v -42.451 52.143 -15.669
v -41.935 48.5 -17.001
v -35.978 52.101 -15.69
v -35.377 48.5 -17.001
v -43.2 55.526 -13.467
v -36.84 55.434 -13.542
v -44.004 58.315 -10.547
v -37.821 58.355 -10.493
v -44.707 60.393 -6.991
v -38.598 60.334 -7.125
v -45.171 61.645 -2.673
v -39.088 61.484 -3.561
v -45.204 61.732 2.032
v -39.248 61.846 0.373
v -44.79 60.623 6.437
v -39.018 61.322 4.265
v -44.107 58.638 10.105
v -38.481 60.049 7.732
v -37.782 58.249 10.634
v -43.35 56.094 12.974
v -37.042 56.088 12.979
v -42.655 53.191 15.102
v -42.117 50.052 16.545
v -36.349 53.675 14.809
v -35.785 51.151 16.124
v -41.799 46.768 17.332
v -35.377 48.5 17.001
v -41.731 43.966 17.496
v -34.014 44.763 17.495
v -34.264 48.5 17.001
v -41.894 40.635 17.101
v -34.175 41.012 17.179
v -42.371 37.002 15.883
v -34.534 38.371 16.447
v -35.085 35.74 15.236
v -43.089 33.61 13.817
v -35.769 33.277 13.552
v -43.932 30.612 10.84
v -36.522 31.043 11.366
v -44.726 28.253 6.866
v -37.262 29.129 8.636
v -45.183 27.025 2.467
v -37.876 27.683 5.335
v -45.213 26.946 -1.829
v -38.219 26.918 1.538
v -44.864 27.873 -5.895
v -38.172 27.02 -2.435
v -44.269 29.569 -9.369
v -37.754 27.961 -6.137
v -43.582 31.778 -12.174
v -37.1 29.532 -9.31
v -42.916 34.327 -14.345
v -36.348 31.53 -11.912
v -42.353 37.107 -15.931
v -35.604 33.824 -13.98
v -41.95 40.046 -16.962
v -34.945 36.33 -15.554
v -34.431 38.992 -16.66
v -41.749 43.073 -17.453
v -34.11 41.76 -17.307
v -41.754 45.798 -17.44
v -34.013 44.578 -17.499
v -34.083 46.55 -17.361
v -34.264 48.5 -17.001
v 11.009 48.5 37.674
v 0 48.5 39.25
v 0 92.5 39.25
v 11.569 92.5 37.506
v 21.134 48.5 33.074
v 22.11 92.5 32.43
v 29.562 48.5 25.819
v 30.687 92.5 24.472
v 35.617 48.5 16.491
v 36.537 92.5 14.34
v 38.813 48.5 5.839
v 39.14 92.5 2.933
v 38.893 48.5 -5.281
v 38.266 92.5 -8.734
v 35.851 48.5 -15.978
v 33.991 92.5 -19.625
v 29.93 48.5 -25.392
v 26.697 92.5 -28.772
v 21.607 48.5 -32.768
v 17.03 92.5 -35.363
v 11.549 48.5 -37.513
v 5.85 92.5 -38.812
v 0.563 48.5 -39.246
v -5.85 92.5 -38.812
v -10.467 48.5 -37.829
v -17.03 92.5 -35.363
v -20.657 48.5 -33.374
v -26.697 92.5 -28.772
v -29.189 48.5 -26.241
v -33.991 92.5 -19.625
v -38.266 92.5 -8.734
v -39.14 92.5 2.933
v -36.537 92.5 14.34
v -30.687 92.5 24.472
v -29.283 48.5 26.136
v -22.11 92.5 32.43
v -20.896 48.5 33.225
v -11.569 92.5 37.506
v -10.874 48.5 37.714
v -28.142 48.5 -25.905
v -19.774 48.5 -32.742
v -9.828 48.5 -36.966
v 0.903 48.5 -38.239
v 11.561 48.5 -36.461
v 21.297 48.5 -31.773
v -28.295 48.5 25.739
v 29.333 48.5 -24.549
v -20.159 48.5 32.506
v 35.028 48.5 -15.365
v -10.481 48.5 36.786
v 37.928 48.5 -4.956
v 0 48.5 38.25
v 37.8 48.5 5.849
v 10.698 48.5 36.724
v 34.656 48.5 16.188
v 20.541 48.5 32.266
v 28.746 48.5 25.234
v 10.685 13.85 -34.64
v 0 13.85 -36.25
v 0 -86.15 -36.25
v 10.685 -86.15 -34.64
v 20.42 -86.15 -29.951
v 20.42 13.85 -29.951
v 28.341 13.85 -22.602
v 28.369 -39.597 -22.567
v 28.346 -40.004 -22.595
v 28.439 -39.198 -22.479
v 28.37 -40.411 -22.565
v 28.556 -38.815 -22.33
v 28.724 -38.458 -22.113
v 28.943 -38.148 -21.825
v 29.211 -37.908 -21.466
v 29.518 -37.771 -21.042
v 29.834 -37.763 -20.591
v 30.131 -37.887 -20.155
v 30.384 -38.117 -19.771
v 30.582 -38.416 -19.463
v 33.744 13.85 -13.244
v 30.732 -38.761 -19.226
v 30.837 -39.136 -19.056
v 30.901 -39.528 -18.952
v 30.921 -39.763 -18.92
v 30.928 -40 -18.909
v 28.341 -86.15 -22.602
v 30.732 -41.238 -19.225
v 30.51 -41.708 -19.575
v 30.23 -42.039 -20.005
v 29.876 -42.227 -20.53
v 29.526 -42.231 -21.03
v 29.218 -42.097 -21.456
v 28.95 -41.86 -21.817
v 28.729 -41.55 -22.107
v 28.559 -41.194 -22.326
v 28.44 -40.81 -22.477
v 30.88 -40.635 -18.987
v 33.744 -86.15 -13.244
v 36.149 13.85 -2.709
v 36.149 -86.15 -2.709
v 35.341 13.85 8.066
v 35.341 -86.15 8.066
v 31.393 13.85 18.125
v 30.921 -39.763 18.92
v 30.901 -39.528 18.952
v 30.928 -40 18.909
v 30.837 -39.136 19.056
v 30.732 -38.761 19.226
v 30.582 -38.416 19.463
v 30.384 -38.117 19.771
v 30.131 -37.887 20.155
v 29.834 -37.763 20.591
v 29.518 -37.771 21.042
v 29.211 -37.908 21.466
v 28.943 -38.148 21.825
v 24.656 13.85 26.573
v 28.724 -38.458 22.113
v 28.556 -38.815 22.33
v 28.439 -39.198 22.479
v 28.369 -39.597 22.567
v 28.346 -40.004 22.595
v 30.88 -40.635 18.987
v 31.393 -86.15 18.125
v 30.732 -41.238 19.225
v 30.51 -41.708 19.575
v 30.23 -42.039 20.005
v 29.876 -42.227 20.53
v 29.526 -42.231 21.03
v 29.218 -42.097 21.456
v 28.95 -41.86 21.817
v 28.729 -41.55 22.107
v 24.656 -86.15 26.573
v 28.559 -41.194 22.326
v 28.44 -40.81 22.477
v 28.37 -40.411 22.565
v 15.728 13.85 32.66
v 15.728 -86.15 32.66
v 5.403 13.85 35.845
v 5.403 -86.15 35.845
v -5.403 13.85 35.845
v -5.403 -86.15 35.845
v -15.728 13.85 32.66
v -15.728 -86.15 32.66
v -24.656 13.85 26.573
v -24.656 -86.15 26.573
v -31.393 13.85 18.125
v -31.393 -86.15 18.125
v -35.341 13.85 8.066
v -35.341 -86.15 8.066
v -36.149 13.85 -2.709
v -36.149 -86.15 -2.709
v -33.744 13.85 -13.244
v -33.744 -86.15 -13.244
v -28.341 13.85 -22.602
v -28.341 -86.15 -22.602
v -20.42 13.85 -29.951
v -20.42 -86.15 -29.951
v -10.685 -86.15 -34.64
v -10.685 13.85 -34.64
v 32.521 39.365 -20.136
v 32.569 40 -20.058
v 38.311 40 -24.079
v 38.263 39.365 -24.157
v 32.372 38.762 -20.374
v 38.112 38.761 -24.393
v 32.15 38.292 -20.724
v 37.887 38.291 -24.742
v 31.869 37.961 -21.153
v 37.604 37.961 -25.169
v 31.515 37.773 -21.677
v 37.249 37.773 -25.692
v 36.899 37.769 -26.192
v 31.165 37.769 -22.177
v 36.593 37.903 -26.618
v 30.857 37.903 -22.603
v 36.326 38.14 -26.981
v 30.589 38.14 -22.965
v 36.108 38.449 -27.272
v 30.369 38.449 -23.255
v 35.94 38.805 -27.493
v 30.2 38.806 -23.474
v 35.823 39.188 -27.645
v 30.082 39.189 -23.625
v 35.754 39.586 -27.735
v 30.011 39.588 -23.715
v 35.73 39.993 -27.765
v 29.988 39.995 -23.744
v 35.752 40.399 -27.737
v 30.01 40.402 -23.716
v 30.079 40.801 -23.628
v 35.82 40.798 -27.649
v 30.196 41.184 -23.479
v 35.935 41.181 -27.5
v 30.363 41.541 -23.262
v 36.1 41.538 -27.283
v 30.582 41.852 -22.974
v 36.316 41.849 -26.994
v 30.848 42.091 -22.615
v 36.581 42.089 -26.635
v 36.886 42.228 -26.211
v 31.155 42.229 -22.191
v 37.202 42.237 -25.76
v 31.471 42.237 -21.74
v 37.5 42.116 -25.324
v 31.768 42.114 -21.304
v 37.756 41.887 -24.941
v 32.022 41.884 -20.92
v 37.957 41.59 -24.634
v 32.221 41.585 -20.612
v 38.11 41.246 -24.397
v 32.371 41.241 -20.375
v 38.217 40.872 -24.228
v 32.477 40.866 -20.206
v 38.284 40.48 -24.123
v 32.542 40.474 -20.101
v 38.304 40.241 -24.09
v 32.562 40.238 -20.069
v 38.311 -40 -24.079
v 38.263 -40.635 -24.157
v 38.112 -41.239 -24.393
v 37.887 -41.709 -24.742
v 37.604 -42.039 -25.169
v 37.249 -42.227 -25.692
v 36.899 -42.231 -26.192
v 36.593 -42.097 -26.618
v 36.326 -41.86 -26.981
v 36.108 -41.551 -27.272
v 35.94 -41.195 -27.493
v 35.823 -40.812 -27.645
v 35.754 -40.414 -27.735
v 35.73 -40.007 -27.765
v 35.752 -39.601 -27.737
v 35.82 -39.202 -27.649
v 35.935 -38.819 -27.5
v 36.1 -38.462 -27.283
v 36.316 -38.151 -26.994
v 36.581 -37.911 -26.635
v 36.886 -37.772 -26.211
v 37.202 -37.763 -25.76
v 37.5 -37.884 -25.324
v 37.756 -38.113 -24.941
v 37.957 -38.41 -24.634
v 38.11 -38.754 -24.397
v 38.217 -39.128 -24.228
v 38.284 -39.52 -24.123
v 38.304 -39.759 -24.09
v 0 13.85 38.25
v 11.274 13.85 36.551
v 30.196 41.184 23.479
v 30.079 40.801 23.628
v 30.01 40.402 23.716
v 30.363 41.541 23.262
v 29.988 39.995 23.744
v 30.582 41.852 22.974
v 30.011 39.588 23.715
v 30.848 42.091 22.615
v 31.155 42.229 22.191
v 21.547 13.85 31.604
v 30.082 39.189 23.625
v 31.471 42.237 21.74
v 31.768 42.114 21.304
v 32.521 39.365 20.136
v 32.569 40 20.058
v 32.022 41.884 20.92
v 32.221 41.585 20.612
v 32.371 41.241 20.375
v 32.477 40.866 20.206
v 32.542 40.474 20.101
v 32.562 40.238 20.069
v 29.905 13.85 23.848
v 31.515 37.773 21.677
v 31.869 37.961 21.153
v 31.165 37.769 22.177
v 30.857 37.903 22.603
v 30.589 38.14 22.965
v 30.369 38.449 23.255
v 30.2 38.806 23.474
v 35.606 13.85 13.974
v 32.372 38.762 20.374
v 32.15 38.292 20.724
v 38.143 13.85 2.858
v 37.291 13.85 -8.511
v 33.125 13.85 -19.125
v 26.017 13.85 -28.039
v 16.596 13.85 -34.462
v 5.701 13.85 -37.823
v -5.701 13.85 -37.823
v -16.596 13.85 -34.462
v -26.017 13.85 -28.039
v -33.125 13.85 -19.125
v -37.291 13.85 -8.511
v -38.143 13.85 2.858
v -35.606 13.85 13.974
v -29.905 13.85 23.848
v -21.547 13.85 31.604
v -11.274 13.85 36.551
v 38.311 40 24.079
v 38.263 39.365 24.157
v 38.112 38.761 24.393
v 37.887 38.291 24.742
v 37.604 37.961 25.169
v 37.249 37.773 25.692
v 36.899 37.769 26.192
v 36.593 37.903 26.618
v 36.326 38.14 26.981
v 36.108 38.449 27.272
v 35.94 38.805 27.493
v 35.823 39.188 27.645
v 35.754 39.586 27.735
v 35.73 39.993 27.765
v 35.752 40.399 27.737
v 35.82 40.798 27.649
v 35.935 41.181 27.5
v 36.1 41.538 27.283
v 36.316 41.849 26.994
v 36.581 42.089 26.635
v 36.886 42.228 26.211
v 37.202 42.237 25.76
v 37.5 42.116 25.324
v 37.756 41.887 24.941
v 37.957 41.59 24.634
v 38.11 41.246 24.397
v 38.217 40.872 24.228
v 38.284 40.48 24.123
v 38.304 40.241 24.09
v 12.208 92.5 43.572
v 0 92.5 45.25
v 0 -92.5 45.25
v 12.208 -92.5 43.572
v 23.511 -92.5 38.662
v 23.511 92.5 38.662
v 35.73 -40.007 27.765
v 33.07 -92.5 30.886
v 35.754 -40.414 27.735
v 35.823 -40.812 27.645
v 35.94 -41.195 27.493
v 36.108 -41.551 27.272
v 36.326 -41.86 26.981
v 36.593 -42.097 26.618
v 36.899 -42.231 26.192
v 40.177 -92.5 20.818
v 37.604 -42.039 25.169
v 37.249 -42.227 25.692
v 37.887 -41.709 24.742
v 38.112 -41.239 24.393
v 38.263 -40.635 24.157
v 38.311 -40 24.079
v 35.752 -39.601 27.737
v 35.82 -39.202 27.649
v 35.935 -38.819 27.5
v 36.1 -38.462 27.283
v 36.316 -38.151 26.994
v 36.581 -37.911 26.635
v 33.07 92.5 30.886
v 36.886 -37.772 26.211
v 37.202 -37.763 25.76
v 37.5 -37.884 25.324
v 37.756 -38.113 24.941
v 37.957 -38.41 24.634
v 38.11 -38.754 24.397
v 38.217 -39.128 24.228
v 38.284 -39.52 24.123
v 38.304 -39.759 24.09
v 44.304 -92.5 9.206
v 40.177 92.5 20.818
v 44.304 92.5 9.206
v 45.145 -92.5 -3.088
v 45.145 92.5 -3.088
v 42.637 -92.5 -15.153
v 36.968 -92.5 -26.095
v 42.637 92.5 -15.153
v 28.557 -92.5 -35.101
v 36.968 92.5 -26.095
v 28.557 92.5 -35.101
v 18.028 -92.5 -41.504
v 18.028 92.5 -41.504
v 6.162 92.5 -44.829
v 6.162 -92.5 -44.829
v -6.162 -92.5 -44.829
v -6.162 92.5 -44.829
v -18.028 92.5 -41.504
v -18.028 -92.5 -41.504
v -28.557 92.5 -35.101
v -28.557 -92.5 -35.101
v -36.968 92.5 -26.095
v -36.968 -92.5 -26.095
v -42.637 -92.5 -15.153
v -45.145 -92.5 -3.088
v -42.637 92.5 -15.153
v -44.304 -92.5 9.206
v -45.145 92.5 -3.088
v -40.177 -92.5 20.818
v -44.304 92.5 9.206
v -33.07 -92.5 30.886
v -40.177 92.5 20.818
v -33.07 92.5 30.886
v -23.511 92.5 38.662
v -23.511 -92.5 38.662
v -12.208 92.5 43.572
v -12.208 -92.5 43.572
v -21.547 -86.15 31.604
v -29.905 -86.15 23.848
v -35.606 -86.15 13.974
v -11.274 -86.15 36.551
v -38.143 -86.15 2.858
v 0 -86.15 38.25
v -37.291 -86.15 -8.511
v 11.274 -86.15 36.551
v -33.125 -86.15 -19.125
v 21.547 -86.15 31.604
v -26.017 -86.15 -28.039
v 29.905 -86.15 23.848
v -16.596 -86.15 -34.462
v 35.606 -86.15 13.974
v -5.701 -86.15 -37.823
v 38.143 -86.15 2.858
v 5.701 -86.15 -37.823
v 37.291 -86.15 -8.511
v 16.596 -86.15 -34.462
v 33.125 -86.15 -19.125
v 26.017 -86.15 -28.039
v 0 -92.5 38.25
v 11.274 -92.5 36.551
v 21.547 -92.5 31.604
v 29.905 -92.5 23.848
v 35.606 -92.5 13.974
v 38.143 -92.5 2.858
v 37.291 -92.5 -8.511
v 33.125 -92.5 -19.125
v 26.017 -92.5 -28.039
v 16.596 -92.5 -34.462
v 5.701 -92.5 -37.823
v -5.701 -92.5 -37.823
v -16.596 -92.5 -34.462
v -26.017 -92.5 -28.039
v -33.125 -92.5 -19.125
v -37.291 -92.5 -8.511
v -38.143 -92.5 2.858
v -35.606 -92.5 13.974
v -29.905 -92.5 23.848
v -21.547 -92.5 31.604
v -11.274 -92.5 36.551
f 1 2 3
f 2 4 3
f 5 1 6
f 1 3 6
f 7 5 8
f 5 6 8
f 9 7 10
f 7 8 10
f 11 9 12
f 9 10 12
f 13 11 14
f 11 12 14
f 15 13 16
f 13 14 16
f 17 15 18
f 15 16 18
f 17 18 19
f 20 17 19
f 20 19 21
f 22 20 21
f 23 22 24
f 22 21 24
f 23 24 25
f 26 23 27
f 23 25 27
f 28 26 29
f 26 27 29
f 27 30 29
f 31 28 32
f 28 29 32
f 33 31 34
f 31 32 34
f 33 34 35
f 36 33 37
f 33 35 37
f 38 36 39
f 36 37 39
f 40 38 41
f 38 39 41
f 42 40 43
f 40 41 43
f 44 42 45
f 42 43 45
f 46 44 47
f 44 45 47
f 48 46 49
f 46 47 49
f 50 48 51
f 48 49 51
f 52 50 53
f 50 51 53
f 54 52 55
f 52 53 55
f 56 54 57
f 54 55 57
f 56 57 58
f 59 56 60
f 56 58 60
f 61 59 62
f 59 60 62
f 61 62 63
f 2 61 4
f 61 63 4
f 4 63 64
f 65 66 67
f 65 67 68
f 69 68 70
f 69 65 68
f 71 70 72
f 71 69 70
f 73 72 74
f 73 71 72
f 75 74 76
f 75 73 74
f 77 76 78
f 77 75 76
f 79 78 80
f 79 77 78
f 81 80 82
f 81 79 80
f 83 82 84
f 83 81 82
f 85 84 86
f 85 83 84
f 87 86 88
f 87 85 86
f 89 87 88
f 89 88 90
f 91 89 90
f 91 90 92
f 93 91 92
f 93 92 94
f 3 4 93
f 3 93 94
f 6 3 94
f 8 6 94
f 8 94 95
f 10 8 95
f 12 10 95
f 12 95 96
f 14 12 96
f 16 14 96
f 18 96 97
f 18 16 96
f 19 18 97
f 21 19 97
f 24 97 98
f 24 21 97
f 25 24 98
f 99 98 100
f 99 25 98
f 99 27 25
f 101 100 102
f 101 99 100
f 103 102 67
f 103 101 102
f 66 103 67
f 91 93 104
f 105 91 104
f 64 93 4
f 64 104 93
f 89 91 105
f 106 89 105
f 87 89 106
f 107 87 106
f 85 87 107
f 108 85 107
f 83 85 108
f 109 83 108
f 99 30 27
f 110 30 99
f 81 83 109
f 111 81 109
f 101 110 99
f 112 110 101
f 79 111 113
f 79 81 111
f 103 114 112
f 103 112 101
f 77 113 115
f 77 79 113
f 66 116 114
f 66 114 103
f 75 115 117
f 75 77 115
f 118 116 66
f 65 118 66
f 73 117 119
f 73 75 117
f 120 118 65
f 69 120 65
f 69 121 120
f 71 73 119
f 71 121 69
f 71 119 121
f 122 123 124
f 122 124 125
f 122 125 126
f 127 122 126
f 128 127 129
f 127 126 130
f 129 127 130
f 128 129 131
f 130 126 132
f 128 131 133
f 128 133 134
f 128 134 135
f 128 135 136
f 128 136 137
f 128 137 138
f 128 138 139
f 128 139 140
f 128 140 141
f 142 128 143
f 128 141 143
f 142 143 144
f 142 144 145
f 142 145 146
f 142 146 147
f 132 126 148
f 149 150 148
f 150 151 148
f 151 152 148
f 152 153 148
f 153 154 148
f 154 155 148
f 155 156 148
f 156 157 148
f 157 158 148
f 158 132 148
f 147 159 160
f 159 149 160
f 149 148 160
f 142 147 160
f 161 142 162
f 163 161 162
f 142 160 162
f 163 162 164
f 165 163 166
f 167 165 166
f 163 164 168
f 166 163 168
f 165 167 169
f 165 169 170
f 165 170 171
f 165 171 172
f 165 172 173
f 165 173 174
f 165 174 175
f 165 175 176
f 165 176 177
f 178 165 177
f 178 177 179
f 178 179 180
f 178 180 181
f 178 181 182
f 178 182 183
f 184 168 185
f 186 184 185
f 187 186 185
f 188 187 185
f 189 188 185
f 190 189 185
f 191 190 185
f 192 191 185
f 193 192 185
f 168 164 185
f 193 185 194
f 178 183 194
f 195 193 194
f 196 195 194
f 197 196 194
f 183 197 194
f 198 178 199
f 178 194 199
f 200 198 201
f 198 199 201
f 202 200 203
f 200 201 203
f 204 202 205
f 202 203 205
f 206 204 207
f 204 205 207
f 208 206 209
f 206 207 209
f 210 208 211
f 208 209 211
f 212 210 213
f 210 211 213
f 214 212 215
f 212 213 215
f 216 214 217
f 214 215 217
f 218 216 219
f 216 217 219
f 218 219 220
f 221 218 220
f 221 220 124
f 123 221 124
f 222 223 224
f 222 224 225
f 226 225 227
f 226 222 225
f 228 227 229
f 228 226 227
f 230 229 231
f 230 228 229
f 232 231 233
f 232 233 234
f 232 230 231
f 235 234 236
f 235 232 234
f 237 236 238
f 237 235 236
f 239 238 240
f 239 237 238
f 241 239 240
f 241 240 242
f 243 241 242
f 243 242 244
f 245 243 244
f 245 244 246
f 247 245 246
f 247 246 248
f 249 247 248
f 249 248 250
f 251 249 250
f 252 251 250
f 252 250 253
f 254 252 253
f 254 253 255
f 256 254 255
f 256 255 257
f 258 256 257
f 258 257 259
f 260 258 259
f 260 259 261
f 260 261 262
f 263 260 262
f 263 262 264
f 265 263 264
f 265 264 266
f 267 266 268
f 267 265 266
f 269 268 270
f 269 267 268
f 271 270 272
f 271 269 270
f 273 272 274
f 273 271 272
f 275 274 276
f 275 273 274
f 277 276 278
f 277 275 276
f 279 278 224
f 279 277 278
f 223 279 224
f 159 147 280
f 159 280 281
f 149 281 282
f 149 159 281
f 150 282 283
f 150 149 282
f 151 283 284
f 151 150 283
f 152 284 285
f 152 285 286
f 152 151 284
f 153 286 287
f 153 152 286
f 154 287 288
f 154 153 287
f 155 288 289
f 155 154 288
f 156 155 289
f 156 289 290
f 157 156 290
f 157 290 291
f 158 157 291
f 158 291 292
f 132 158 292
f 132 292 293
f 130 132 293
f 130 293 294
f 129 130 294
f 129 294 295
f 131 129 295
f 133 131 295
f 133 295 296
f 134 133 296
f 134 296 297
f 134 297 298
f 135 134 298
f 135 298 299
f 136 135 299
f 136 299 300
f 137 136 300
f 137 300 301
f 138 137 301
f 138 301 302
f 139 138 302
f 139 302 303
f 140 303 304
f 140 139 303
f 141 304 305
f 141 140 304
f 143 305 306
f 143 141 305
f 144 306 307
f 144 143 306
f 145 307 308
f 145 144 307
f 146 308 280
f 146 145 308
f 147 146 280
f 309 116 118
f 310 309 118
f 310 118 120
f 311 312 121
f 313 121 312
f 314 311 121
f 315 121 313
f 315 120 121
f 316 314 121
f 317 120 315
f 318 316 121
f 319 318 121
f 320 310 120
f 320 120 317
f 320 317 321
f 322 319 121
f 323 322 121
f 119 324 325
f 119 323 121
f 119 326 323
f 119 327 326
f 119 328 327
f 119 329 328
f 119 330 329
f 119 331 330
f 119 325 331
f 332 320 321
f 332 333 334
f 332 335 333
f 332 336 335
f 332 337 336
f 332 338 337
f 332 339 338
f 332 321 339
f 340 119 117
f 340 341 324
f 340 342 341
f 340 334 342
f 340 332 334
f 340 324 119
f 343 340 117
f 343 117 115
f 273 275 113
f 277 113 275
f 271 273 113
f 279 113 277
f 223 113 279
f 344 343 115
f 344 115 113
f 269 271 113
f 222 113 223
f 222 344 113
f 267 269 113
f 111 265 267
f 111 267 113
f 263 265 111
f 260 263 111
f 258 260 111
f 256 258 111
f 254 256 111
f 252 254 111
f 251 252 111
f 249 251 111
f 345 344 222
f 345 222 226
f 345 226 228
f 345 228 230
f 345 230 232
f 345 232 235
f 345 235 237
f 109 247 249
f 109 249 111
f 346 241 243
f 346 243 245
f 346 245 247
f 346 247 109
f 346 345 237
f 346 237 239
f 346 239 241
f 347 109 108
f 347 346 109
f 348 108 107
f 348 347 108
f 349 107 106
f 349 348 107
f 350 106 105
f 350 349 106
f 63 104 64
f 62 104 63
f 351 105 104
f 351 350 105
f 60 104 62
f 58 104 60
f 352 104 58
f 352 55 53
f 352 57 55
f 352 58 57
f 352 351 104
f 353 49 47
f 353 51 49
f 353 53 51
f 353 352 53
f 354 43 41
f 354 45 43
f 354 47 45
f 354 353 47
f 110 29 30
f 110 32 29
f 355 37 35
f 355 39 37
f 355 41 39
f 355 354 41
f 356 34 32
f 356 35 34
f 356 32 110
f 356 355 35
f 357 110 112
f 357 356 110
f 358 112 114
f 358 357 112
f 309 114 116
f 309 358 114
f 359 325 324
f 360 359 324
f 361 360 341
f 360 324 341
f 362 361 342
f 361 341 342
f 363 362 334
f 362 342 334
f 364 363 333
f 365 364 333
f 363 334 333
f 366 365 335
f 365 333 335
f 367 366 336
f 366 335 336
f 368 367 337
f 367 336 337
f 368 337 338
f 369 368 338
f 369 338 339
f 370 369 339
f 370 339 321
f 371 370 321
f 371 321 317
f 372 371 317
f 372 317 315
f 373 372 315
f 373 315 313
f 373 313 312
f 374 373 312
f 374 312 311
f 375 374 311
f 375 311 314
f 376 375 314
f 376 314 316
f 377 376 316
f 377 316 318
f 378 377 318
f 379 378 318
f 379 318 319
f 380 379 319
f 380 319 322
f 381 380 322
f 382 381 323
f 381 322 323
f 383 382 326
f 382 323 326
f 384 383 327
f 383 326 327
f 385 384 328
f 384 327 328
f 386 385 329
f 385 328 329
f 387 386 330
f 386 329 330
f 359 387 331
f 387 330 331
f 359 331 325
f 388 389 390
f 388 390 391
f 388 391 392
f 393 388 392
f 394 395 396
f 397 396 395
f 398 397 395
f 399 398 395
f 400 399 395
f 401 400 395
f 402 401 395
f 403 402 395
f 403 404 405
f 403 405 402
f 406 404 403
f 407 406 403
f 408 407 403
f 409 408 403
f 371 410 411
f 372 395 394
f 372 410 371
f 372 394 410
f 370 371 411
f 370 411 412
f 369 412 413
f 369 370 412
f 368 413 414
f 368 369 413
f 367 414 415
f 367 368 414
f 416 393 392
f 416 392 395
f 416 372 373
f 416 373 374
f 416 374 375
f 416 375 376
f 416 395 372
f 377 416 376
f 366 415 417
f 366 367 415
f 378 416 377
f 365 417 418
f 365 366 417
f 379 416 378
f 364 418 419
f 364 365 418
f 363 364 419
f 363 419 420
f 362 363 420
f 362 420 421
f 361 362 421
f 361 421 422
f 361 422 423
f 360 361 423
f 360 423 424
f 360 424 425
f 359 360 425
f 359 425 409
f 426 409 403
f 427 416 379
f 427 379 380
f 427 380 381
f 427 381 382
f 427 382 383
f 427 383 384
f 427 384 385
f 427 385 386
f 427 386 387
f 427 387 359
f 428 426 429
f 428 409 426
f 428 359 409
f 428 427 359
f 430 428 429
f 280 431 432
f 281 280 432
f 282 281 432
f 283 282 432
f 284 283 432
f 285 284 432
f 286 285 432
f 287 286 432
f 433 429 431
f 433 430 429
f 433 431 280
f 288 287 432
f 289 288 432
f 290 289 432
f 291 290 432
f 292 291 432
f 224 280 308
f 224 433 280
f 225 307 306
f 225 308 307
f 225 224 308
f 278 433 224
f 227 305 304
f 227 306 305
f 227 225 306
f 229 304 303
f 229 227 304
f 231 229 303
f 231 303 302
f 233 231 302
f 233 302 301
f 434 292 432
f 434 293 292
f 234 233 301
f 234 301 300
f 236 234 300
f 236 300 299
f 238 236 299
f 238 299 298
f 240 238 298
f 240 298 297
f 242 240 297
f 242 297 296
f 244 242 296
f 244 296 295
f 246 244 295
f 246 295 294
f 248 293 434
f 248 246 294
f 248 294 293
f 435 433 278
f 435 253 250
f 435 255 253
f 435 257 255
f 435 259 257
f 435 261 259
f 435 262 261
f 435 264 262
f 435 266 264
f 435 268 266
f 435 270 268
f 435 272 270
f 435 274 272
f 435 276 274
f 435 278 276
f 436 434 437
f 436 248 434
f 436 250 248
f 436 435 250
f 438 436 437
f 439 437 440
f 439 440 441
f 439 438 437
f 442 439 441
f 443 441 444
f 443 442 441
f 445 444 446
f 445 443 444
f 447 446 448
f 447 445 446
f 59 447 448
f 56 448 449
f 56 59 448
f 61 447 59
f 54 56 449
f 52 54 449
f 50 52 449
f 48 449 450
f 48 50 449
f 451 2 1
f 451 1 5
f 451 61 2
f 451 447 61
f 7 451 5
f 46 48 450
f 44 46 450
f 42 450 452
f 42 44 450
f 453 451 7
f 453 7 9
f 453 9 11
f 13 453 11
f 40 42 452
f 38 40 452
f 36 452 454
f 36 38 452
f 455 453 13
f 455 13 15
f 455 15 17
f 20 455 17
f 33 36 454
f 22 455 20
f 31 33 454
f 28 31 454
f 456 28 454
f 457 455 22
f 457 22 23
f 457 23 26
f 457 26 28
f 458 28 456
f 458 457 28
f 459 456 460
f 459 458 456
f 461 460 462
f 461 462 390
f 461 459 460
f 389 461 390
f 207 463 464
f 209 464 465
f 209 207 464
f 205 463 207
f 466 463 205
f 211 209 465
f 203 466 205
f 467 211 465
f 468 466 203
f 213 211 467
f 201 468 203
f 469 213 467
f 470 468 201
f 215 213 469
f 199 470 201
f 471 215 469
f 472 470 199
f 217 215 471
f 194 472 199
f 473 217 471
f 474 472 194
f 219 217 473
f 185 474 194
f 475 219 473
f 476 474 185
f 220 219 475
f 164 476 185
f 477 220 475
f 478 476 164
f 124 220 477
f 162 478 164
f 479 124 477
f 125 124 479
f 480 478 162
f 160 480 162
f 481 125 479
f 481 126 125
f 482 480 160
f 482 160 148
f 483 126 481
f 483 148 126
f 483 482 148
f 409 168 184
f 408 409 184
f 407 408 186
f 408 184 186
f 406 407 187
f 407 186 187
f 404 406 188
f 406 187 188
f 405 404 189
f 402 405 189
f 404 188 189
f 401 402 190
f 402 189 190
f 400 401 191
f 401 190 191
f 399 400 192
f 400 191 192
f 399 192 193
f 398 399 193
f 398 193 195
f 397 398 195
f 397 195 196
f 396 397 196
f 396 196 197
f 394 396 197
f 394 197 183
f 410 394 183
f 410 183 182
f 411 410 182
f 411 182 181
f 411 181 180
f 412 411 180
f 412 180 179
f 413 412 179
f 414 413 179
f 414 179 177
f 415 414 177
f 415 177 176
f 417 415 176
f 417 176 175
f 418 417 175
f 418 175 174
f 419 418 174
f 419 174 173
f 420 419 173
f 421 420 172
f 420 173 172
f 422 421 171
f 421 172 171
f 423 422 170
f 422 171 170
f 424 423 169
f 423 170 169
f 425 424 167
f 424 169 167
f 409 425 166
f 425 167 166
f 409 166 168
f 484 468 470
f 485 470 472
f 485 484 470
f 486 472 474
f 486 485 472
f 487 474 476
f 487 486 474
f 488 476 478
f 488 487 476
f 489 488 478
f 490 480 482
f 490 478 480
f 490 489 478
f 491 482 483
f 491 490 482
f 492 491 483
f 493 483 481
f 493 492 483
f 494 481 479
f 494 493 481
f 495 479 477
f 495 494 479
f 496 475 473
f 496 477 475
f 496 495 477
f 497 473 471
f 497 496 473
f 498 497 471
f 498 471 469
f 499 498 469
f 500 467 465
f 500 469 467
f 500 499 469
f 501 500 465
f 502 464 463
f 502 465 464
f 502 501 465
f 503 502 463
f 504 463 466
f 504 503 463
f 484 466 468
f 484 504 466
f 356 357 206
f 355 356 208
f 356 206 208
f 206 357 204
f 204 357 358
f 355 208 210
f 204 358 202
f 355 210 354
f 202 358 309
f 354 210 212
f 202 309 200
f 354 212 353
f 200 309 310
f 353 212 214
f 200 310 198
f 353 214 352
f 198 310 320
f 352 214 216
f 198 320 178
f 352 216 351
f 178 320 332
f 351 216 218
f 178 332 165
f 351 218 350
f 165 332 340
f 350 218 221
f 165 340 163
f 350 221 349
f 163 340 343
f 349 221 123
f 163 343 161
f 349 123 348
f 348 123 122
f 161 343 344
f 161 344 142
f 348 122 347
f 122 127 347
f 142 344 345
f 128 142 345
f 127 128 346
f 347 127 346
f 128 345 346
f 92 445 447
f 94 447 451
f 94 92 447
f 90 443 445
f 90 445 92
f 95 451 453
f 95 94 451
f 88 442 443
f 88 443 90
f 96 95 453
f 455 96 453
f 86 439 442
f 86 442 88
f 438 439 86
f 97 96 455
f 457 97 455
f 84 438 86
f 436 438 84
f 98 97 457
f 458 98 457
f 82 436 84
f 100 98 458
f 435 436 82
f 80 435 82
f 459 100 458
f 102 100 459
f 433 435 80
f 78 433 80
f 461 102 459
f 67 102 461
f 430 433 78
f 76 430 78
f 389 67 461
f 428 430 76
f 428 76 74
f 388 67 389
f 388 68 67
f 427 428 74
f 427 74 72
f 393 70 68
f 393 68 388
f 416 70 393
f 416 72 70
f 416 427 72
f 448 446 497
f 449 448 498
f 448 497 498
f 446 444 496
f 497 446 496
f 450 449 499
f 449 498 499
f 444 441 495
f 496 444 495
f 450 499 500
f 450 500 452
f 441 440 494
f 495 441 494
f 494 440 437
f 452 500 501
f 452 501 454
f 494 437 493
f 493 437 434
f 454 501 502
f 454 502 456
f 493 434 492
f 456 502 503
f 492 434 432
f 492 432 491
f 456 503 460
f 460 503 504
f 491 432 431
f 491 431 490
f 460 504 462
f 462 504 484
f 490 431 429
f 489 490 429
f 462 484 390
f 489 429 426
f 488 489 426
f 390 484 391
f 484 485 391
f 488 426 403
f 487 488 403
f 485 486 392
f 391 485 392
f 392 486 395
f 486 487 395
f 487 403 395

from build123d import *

# Parameters (mm, degrees)
SKETCH1_R           = 45.25
SKETCH1_R_2         = 38.25
BOSS_EXTRUDE1_DEPTH = 92.5
BOSS_EXTRUDE2_START = -6.35
SKETCH2_R           = 38.25
SKETCH2_R_2         = 36.25
BOSS_EXTRUDE2_DEPTH = 100
CUT_EXTRUDE3_START  = -44
SKETCH6_R           = 39.25
SKETCH6_R_2         = 38.25
CUT_EXTRUDE3_DEPTH  = 44
SKETCH7_R           = 17.5
CUT_EXTRUDE4_DEPTH  = 113.478331247
SKETCH10_R          = 2.25
CUT_EXTRUDE5_DEPTH  = 113.47833141


with BuildPart() as part:
    # Sketch1 → Boss-Extrude1 (new, symmetric)
    with BuildSketch(Plane(origin=(0, 0, 0), x_dir=(1, 0, 0), z_dir=(0, 1, 0))):
        with Locations(Location((0, 0, 0), (0, 0, 270))):
            Circle(SKETCH1_R)
        with Locations(Location((0, 0, 0), (0, 0, 270))):
            Circle(SKETCH1_R_2, mode=Mode.SUBTRACT)
    extrude(amount=BOSS_EXTRUDE1_DEPTH, both=True)

    # Sketch2 → Boss-Extrude2 (add)
    with BuildSketch(Plane.XZ.offset(92.5).offset(BOSS_EXTRUDE2_START)):
        with Locations(Location((0, 0, 0), (0, 0, 270))):
            Circle(SKETCH2_R)
        with Locations(Location((0, 0, 0), (0, 0, 270))):
            Circle(SKETCH2_R_2, mode=Mode.SUBTRACT)
    extrude(amount=-BOSS_EXTRUDE2_DEPTH)

    # Sketch6 → Cut-Extrude3 (cut)
    with BuildSketch(Plane(origin=(0, 92.5, 0), x_dir=(1, 0, 0), z_dir=(0, 1, 0)).offset(CUT_EXTRUDE3_START)):
        with Locations(Location((0, 0, 0), (0, 0, 270))):
            Circle(SKETCH6_R)
        with Locations(Location((0, 0, 0), (0, 0, 90))):
            Circle(SKETCH6_R_2, mode=Mode.SUBTRACT)
    extrude(amount=CUT_EXTRUDE3_DEPTH, mode=Mode.SUBTRACT)

    # Sketch7 → Cut-Extrude4 (cut, through all)
    with BuildSketch(Plane(origin=(0, 0, 0), x_dir=(0, 0, -1), z_dir=(1, 0, 0))):
        with Locations(Location((0, 44.35, 0), (0, 0, 13.717970606))):
            Circle(SKETCH7_R)
    extrude(amount=-CUT_EXTRUDE4_DEPTH, mode=Mode.SUBTRACT)

    # Sketch10 → Cut-Extrude5 (cut, through all)
    with BuildSketch(Plane(origin=(0, 0, 0), x_dir=(-0.5735764363510474, 0, -0.819152044288991), z_dir=(0.819152044288991, 0, -0.5735764363510474))):
        with Locations(Location((0, 40, 0), (0, 0, 180))):
            Circle(SKETCH10_R)
        with Locations(Location((0, -40, 0), (0, 0, 180))):
            Circle(SKETCH10_R)
    cut_extrude5 = extrude(amount=CUT_EXTRUDE5_DEPTH, mode=Mode.SUBTRACT)

    # Mirror1: Cut-Extrude5 across plane
    add(cut_extrude5.mirror(Plane.XY), mode=Mode.SUBTRACT)


solid = part.part
